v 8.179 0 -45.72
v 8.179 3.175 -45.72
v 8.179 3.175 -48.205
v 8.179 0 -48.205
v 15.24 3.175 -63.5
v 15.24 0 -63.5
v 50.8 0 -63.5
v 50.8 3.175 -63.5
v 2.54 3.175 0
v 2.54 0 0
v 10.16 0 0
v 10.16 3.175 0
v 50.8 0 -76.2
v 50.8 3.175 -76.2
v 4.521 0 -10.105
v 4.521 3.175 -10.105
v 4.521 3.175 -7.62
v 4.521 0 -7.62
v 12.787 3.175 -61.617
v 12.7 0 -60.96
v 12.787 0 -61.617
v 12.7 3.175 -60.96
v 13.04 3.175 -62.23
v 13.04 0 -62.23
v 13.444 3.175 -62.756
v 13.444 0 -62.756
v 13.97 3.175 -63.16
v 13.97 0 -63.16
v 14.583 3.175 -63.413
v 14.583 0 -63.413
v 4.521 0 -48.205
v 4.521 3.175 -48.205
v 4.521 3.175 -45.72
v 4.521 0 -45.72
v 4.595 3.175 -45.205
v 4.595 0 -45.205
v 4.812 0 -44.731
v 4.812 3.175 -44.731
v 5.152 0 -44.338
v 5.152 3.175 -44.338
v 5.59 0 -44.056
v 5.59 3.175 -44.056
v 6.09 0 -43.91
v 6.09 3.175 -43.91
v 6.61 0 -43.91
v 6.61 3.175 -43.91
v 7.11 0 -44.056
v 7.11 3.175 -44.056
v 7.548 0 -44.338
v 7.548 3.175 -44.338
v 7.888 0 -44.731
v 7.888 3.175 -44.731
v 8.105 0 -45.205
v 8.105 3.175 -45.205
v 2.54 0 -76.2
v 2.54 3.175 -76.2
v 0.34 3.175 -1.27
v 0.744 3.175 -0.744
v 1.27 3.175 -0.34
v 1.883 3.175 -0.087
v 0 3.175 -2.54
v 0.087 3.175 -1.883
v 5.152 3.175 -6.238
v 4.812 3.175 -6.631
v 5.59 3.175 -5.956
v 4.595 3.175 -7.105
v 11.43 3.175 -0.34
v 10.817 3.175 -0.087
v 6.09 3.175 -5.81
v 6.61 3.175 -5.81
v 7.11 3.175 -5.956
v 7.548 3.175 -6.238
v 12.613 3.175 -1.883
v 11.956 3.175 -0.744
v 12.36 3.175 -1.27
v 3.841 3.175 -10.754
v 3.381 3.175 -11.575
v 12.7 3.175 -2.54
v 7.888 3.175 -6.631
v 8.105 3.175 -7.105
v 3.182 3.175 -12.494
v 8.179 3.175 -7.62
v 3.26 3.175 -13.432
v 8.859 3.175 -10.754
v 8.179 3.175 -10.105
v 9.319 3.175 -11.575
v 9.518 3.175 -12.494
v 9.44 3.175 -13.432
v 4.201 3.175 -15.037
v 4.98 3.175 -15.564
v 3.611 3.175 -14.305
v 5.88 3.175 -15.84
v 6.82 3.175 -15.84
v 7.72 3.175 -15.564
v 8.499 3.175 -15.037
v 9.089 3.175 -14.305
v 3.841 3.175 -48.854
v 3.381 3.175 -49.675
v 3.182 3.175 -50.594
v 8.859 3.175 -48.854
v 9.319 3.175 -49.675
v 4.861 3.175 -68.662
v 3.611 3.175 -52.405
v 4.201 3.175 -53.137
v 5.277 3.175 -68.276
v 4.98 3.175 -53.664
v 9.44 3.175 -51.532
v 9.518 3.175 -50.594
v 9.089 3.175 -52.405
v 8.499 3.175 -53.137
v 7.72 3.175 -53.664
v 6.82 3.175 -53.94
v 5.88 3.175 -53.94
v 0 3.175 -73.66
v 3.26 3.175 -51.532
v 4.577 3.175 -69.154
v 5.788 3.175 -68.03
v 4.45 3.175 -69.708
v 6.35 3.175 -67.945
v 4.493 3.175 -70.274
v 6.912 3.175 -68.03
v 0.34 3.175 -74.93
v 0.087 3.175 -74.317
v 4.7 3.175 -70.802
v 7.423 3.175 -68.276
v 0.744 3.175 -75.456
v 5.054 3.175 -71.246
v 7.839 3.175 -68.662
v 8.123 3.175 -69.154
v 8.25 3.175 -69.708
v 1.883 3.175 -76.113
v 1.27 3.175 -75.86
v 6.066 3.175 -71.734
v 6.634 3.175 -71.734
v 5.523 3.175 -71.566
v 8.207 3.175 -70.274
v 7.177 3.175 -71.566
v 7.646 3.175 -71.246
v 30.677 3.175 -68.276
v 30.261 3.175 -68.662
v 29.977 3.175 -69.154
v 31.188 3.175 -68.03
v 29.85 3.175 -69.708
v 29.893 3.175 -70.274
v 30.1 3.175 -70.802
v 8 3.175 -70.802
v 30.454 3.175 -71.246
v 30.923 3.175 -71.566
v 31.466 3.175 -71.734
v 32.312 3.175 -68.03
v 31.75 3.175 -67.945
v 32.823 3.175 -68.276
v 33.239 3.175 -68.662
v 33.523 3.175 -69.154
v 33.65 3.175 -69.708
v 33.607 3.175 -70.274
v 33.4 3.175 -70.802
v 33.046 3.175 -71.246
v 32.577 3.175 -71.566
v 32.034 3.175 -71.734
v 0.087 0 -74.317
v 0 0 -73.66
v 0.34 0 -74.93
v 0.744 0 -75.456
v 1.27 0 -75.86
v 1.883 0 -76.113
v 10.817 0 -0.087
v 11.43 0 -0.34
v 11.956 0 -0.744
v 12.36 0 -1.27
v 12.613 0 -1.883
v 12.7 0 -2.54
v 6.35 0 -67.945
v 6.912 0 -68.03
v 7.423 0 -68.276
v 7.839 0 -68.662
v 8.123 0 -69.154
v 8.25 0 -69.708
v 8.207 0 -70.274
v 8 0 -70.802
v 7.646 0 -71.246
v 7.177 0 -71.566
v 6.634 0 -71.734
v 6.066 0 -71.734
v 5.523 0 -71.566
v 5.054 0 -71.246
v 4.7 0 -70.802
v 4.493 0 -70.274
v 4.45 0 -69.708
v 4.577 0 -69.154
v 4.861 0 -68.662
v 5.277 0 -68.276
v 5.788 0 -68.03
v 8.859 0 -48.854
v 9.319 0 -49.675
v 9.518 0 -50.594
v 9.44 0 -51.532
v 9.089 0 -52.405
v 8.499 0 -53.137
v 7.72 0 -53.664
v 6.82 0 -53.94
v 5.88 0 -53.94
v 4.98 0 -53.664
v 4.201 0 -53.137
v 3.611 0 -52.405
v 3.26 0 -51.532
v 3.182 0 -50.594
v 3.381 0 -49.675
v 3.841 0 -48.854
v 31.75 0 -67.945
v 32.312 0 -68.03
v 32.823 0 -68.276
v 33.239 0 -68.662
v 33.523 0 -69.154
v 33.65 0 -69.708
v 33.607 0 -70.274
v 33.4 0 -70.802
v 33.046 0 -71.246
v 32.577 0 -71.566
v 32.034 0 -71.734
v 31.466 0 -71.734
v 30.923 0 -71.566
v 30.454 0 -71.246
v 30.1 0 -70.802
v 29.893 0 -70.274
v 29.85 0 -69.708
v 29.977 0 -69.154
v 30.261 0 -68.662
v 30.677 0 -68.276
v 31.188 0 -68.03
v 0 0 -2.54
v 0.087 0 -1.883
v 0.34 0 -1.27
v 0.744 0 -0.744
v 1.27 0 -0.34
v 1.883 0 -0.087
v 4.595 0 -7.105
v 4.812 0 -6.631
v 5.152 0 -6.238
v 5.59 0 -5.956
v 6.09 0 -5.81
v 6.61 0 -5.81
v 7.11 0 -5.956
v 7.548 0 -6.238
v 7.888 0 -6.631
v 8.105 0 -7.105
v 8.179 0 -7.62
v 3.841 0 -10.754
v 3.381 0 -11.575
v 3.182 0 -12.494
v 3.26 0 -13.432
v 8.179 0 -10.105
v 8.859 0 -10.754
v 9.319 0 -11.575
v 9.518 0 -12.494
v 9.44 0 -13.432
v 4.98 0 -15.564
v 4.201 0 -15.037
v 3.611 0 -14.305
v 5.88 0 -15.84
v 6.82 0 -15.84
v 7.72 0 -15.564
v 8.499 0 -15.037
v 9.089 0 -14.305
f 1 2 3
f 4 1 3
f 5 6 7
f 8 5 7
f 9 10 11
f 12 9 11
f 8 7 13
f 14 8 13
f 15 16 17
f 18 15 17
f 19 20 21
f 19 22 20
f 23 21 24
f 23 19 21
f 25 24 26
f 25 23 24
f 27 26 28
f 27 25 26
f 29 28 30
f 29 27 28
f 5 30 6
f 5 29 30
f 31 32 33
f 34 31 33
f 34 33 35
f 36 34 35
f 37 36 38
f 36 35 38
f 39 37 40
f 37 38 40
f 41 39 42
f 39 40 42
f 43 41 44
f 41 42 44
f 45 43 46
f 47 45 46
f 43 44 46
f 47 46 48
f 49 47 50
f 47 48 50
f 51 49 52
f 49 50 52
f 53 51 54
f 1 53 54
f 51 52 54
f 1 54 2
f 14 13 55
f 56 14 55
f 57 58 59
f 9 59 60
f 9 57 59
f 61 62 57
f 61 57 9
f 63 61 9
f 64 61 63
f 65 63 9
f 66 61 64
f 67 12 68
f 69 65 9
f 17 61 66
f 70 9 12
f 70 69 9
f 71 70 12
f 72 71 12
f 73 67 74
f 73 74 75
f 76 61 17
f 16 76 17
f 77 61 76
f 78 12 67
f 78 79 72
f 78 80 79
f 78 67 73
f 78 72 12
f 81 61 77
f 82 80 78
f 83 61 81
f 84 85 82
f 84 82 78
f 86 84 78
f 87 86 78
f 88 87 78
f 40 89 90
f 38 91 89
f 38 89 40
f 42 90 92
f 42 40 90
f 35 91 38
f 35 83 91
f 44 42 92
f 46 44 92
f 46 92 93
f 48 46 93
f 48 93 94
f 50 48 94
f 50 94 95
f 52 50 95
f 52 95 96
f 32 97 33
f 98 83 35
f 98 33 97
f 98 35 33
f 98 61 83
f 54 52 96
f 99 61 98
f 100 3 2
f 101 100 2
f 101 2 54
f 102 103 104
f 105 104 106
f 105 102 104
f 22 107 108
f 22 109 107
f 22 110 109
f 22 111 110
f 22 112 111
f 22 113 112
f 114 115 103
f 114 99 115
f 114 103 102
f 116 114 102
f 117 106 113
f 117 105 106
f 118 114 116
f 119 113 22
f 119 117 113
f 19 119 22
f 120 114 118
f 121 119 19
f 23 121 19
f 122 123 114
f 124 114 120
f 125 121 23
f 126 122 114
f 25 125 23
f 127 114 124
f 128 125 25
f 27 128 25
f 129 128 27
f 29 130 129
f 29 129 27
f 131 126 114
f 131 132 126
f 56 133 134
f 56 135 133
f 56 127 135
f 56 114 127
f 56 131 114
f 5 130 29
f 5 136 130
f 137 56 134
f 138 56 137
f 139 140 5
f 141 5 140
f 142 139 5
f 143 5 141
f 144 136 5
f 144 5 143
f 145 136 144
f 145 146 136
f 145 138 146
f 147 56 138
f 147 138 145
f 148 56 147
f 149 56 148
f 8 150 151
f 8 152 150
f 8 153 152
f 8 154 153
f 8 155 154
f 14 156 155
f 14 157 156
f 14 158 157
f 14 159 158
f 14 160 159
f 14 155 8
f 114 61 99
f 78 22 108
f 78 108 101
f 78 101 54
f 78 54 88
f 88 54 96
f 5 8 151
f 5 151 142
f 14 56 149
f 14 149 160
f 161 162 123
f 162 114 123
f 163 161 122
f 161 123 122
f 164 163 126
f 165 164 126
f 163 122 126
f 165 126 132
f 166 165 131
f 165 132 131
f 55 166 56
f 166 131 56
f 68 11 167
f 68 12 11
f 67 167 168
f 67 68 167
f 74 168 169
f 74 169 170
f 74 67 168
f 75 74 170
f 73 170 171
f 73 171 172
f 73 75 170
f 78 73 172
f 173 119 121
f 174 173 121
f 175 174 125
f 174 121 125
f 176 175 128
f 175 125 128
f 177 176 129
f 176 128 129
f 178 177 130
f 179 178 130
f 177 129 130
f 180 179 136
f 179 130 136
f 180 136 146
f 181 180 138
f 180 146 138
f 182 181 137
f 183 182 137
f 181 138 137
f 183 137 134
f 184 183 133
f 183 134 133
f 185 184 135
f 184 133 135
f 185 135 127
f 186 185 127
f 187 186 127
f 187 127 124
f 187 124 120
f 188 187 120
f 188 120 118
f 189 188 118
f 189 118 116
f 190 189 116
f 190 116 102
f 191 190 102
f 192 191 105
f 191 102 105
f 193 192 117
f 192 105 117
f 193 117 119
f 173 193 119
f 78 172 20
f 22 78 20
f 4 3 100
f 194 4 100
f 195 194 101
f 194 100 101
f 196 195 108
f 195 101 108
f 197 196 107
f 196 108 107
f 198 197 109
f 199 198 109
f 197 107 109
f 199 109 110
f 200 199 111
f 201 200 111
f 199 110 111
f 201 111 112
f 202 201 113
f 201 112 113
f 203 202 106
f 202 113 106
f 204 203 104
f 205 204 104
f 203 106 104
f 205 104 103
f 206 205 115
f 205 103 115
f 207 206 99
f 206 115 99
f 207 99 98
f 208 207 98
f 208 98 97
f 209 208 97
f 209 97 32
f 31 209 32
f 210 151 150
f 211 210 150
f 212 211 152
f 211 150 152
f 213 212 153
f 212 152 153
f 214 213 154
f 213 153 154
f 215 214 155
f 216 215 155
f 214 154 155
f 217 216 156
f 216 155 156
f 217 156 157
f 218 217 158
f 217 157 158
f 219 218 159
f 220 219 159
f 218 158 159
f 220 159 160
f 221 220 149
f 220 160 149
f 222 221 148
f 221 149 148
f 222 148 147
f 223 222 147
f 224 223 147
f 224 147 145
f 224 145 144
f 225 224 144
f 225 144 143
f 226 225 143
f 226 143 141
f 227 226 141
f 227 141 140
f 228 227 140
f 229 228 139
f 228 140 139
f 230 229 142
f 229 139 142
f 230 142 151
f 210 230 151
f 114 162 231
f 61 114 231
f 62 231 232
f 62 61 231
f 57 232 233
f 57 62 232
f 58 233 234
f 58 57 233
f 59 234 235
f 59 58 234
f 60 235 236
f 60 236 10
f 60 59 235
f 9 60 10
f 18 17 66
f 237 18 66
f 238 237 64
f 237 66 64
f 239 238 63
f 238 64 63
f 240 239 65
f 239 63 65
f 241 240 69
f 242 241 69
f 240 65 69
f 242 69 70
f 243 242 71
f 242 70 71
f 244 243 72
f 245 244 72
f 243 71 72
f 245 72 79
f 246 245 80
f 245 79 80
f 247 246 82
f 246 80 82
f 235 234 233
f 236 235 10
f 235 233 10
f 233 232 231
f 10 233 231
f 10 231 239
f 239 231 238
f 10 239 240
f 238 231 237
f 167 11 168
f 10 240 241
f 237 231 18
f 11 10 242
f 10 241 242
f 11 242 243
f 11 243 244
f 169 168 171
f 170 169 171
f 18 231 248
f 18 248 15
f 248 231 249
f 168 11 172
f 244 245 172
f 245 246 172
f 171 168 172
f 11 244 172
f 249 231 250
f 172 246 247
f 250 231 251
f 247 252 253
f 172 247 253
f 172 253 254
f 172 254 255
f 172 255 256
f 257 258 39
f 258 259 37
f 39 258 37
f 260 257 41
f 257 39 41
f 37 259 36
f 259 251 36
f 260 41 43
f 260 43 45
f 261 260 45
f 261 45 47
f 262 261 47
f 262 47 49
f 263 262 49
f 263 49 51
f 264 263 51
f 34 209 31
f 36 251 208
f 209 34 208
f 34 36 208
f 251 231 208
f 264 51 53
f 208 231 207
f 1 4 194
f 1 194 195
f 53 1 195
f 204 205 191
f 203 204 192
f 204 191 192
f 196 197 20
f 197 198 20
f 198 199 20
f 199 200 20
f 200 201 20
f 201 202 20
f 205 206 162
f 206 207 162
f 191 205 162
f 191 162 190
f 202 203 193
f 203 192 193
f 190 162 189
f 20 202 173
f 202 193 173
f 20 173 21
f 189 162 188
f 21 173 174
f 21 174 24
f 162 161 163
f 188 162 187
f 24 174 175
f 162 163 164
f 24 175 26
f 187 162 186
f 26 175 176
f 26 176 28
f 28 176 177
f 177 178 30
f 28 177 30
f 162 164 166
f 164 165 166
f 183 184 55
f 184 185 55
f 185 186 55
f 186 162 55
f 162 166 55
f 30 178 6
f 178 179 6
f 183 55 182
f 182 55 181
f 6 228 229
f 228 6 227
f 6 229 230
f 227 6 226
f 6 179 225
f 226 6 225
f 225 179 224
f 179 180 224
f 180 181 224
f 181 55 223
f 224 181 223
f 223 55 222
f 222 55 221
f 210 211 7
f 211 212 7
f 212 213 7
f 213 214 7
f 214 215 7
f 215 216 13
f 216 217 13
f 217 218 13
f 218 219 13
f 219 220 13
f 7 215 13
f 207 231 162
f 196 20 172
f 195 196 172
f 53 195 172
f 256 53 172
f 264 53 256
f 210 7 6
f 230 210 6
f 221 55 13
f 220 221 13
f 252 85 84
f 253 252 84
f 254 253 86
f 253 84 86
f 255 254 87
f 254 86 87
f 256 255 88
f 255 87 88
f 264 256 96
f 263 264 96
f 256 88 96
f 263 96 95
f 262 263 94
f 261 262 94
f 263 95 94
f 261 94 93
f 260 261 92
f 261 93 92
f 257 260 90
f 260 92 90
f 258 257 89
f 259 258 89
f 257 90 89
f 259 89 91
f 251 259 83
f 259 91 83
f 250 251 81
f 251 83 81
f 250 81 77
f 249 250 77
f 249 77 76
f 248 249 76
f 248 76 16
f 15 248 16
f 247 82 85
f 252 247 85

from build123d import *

# Parameters (mm, degrees)
BOSS_EXTRUDE1_DEPTH = 3.175
SKETCH2_R           = 1.905
CUT_EXTRUDE1_DEPTH  = 3.175
FILLET3_R           = 2.54


with BuildPart() as part:
    # Sketch1 → Boss-Extrude1 (new body)
    with BuildSketch(Plane(origin=(0, 0, 0), x_dir=(1, 0, 0), z_dir=(0, 1, 0))):
        Polygon((0, 76.2), (0, 0), (12.7, 0), (12.7, 63.5), (50.8, 63.5), (50.8, 76.2), align=None)
    extrude(amount=BOSS_EXTRUDE1_DEPTH)

    # Sketch2 → Cut-Extrude1 (cut)
    with BuildSketch(Plane(origin=(0, 3.175, 0), x_dir=(1, 0, 0), z_dir=(0, 1, 0))):
        with BuildLine():
            Line((4.5212, 48.204597226), (4.5212, 45.72))
            ThreePointArc((4.5212, 45.72), (6.35, 43.8912), (8.1788, 45.72))
            Line((8.1788, 45.72), (8.1788, 48.204597226))
            ThreePointArc((8.1788, 48.204597226), (6.35, 53.975), (4.5212, 48.204597226))
        make_face()
        with BuildLine():
            Line((4.5212, 10.104597226), (4.5212, 7.62))
            ThreePointArc((4.5212, 7.62), (6.35, 5.7912), (8.1788, 7.62))
            Line((8.1788, 7.62), (8.1788, 10.104597226))
            ThreePointArc((8.1788, 10.104597226), (6.35, 15.875), (4.5212, 10.104597226))
        make_face()
        with Locations(Location((31.75, 69.85, 0), (0, 0, 270))):
            Circle(SKETCH2_R)
        with Locations(Location((6.35, 69.85, 0), (0, 0, 270))):
            Circle(SKETCH2_R)
    extrude(amount=-CUT_EXTRUDE1_DEPTH, mode=Mode.SUBTRACT)

    # Fillet3
    fillet3_edges = [part.edges().sort_by_distance(p)[0] for p in [
        (12.7, 1.5875, -63.5),
        (12.7, 1.5875, 0),
        (0, 1.5875, 0),
        (0, 1.5875, -76.2),
    ]]
    fillet(fillet3_edges, radius=FILLET3_R)


solid = part.part
